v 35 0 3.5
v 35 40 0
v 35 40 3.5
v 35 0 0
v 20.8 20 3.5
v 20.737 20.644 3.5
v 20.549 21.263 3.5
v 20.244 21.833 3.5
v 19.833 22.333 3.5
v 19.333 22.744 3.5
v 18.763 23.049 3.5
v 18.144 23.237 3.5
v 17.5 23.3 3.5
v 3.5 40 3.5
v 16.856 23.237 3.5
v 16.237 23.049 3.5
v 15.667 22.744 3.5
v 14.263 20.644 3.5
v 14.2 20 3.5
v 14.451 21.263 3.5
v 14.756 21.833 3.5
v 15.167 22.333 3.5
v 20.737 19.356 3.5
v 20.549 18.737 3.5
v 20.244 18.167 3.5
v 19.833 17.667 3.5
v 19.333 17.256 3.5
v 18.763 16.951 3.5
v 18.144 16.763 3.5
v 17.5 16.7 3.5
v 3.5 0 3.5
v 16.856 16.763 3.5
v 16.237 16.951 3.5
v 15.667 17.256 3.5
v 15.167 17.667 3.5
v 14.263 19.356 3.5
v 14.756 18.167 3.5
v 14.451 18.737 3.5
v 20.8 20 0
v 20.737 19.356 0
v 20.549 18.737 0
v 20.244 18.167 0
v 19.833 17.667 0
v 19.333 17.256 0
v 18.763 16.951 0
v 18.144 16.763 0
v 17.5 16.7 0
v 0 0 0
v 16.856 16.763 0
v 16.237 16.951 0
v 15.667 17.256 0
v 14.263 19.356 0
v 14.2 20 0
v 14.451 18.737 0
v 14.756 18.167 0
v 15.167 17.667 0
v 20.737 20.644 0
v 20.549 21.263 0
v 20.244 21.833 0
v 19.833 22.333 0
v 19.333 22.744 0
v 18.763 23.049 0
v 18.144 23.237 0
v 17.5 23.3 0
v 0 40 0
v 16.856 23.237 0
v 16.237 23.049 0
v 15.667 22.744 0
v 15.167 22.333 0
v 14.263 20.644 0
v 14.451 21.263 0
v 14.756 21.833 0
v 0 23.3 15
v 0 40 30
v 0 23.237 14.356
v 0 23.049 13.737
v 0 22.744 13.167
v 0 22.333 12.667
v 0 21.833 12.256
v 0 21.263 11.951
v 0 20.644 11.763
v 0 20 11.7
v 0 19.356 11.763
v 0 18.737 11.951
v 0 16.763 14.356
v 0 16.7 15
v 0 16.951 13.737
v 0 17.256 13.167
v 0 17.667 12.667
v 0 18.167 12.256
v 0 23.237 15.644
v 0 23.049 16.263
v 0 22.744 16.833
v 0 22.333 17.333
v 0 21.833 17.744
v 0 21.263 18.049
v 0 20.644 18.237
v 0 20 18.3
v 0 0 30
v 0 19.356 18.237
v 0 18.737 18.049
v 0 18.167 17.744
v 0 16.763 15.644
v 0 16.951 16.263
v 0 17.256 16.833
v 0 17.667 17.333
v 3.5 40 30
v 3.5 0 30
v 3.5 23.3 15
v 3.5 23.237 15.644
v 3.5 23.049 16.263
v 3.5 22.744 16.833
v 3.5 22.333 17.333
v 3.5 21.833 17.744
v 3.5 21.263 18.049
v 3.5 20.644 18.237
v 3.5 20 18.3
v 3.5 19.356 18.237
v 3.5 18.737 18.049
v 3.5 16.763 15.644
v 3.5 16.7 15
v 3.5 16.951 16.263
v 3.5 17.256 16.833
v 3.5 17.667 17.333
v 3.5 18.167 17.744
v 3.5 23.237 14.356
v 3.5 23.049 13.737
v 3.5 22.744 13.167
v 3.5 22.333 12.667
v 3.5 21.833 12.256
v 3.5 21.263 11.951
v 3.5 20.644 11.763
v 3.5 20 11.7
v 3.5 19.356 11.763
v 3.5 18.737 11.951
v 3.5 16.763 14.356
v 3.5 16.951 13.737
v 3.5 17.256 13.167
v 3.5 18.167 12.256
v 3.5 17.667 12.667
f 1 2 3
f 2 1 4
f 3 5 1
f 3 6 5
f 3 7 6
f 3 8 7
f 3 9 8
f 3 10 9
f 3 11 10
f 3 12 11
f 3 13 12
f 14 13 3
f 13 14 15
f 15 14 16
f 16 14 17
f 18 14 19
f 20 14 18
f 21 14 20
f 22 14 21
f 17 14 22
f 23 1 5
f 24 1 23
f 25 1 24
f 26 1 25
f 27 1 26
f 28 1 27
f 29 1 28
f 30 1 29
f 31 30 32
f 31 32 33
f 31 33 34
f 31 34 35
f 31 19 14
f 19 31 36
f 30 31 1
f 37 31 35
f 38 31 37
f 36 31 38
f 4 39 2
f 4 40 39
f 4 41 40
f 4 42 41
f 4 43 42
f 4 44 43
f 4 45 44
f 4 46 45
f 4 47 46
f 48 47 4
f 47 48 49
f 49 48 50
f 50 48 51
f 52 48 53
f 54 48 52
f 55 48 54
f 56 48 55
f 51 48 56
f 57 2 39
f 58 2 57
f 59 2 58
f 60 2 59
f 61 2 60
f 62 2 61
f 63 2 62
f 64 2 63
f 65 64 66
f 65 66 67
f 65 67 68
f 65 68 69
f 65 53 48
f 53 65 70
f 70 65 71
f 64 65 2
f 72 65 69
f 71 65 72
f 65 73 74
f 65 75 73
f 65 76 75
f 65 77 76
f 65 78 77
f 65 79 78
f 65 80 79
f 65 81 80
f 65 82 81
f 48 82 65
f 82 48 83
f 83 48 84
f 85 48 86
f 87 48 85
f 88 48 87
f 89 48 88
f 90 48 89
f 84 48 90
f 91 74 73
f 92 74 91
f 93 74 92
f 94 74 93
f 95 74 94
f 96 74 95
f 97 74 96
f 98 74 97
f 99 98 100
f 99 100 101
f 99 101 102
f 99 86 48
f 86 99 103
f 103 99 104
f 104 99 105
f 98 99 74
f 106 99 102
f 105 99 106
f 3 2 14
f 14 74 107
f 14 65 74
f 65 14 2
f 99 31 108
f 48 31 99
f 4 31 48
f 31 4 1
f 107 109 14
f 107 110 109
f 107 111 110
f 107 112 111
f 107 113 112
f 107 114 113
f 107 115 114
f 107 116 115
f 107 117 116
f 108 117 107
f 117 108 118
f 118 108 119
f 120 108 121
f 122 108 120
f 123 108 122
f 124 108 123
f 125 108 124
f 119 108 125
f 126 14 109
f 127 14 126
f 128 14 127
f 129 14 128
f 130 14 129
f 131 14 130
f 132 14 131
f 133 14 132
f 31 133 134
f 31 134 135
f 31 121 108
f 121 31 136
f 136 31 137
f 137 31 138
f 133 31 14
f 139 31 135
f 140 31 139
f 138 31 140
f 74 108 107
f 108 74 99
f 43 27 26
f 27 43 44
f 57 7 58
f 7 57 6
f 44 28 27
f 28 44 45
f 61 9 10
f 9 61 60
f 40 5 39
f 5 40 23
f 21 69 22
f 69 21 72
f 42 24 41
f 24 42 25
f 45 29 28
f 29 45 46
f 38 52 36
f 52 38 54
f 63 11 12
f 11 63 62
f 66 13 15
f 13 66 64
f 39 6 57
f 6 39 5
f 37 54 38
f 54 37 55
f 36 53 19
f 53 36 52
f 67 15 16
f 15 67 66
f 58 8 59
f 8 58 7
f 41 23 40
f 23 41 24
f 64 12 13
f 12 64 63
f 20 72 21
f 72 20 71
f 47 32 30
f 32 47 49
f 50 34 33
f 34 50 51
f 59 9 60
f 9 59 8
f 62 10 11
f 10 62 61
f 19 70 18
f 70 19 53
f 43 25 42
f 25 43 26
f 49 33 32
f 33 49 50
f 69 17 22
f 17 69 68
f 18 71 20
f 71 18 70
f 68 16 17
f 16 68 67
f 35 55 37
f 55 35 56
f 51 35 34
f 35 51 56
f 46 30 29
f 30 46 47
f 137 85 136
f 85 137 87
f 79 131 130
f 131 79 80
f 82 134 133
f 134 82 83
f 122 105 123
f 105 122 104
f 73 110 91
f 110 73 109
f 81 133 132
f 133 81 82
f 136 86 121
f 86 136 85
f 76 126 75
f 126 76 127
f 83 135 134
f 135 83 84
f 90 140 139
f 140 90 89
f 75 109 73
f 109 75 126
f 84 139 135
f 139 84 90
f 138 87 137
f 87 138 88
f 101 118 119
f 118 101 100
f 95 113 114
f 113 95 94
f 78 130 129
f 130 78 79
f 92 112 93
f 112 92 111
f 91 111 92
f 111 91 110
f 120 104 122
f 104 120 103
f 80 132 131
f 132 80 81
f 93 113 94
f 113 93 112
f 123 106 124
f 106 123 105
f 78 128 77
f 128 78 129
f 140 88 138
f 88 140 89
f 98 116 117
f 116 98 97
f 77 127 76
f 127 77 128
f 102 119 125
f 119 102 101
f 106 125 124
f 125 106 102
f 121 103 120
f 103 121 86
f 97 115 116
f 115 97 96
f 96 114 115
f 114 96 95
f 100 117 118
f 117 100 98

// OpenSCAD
$fn = 32;

// ----------------------------------------------------------------------
// L-bracket: 35 x 40 x 30 mm
// ----------------------------------------------------------------------

// --- parameters (mm) ---
base_len = 35;            // horizontal leg, X
upright_h = 30;           // vertical leg, Z
flange_w = 40;            // bracket depth, Y
mat_t = 3.5;              // plate thickness
hole_d = 6.6;             // clearance for M6

module hole_z(px, py) {
  translate([px, py, -0.5]) cylinder(h = mat_t + 1, d = hole_d);
}
module hole_x(pz, py) {
  translate([-0.5, py, pz]) rotate([0, 90, 0]) cylinder(h = mat_t + 1, d = hole_d);
}

difference() {
  union() {
    /* horizontal leg */
    cube([base_len, flange_w, mat_t]);
    /* vertical leg, overlapping the corner block */
    cube([mat_t, flange_w, upright_h]);
  }
  hole_z(17.5, 20);
  hole_x(15, 20);
}
